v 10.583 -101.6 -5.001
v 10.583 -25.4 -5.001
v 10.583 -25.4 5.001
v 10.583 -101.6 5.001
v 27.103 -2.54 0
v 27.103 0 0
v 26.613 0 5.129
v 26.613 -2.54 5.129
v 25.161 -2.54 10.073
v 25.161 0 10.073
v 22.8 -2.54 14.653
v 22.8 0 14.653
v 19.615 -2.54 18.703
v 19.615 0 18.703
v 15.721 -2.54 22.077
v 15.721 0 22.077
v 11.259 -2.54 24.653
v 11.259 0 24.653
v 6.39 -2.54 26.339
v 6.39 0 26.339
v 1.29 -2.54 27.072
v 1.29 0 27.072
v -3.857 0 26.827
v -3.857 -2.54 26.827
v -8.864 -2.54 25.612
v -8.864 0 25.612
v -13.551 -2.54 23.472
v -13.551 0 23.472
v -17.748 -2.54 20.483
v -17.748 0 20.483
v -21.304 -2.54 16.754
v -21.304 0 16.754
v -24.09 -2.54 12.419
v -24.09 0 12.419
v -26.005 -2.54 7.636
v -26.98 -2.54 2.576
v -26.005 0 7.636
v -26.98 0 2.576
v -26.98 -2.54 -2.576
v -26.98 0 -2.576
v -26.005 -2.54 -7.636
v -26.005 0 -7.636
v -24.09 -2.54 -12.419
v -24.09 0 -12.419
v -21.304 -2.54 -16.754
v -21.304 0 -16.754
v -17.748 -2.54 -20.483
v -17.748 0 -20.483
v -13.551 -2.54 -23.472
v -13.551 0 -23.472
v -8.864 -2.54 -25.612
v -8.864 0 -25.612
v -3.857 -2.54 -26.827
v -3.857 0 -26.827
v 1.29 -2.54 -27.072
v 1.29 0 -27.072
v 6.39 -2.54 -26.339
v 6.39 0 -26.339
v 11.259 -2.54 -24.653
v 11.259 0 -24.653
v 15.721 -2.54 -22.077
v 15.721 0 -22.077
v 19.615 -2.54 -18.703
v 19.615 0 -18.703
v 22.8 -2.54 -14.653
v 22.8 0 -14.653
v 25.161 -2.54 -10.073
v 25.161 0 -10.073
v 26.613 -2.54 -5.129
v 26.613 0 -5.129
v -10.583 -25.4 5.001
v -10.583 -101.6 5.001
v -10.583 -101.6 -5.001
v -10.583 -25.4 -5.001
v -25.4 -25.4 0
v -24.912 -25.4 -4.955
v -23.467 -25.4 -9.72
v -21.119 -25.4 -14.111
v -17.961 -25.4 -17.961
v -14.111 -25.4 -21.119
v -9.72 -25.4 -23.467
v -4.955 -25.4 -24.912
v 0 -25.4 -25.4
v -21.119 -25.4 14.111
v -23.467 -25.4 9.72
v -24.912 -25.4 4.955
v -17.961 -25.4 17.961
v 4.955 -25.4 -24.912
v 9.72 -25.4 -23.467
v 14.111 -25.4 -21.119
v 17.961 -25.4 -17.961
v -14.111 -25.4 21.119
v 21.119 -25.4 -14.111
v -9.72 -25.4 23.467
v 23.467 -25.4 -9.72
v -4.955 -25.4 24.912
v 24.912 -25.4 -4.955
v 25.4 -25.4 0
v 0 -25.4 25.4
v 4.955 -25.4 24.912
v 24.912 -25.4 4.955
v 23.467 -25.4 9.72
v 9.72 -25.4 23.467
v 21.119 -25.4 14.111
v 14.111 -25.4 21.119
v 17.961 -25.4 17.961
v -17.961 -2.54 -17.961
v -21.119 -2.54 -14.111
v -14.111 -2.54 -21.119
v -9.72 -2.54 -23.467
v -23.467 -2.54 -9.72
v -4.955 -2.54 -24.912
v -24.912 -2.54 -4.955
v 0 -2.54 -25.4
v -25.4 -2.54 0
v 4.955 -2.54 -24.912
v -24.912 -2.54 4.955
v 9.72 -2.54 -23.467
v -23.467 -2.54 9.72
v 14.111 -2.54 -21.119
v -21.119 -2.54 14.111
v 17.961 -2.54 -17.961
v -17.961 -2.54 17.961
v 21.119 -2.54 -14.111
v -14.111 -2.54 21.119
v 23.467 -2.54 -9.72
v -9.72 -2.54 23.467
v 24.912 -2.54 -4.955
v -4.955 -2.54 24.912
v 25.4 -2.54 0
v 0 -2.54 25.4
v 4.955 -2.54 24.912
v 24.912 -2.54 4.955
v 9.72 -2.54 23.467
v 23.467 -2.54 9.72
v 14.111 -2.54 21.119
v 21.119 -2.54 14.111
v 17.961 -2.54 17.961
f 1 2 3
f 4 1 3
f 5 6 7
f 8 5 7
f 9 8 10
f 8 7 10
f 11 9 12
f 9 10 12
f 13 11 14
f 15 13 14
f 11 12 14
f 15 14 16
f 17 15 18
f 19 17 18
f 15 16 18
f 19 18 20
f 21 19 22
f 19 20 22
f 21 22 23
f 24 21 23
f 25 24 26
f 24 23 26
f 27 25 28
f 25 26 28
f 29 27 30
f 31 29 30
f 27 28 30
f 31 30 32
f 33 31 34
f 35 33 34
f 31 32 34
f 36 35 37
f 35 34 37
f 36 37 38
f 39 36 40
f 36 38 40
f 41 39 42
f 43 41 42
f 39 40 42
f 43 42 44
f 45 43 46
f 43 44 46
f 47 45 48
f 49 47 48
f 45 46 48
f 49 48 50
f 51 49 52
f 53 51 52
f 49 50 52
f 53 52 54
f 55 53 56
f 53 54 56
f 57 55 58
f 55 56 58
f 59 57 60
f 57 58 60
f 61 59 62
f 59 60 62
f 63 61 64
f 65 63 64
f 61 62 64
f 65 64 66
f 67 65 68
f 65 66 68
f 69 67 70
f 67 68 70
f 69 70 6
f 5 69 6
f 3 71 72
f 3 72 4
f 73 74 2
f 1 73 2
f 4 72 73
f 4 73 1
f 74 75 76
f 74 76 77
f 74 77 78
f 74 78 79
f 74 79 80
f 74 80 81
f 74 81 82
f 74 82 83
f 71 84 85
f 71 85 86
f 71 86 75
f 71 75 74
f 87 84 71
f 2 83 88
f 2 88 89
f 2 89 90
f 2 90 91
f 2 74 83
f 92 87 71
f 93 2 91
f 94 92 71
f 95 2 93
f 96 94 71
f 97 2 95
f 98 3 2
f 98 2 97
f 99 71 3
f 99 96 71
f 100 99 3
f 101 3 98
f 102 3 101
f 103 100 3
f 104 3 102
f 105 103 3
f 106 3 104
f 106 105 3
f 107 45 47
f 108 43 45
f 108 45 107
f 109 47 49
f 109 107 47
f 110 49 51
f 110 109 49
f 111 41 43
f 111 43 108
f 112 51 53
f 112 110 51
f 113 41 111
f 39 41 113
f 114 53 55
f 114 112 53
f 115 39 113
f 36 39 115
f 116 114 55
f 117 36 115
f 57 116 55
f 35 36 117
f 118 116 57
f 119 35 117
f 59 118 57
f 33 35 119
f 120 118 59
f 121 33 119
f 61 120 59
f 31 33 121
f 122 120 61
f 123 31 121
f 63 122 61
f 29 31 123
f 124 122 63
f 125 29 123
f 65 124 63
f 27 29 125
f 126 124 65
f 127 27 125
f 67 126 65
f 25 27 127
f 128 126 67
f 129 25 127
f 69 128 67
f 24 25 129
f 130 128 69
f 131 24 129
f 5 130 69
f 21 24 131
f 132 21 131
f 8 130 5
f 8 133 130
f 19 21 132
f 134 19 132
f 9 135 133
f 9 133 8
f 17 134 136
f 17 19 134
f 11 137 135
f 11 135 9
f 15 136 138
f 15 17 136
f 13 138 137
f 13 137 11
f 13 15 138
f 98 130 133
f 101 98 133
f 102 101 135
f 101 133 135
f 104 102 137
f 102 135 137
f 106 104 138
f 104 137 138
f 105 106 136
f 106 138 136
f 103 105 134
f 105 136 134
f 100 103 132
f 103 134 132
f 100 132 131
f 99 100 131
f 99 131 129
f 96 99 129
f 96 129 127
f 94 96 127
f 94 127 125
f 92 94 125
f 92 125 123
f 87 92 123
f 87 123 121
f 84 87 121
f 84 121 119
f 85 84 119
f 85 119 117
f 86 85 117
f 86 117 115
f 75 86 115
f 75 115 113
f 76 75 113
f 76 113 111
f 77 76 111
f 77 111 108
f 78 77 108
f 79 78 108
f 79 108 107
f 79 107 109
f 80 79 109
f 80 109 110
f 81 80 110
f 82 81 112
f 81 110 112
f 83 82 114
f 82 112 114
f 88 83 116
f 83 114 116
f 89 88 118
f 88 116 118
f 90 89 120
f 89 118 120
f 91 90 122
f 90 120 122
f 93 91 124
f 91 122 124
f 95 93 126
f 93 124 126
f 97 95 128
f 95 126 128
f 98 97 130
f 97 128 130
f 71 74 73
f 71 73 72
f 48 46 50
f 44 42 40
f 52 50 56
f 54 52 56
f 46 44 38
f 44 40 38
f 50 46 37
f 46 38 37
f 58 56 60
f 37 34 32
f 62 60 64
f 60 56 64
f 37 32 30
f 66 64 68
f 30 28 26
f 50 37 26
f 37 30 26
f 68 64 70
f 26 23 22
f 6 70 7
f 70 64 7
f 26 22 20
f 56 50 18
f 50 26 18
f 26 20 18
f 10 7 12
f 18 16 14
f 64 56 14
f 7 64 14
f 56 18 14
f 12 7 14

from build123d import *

# Parameters (mm, degrees)
F0_R     = 25.4
F1_DEPTH = 25.4
F2_W     = 21.16544
F2_H     = 10.00125
F3_DEPTH = 101.6
F4_R     = 27.102651
F5_DEPTH = 2.54


with BuildPart() as f1:
    # F0 (on Front) → F1 (new body)
    with BuildSketch(Plane.XZ):
        Circle(F0_R)
    extrude(amount=F1_DEPTH)

    # F2 (on Front) → F3 (join)
    with BuildSketch(Plane.XZ):
        Rectangle(F2_W, F2_H)
    extrude(amount=F3_DEPTH)

    # F4 (on Front) → F5 (join)
    with BuildSketch(Plane.XZ):
        Circle(F4_R)
    extrude(amount=F5_DEPTH)


solid = f1.part
